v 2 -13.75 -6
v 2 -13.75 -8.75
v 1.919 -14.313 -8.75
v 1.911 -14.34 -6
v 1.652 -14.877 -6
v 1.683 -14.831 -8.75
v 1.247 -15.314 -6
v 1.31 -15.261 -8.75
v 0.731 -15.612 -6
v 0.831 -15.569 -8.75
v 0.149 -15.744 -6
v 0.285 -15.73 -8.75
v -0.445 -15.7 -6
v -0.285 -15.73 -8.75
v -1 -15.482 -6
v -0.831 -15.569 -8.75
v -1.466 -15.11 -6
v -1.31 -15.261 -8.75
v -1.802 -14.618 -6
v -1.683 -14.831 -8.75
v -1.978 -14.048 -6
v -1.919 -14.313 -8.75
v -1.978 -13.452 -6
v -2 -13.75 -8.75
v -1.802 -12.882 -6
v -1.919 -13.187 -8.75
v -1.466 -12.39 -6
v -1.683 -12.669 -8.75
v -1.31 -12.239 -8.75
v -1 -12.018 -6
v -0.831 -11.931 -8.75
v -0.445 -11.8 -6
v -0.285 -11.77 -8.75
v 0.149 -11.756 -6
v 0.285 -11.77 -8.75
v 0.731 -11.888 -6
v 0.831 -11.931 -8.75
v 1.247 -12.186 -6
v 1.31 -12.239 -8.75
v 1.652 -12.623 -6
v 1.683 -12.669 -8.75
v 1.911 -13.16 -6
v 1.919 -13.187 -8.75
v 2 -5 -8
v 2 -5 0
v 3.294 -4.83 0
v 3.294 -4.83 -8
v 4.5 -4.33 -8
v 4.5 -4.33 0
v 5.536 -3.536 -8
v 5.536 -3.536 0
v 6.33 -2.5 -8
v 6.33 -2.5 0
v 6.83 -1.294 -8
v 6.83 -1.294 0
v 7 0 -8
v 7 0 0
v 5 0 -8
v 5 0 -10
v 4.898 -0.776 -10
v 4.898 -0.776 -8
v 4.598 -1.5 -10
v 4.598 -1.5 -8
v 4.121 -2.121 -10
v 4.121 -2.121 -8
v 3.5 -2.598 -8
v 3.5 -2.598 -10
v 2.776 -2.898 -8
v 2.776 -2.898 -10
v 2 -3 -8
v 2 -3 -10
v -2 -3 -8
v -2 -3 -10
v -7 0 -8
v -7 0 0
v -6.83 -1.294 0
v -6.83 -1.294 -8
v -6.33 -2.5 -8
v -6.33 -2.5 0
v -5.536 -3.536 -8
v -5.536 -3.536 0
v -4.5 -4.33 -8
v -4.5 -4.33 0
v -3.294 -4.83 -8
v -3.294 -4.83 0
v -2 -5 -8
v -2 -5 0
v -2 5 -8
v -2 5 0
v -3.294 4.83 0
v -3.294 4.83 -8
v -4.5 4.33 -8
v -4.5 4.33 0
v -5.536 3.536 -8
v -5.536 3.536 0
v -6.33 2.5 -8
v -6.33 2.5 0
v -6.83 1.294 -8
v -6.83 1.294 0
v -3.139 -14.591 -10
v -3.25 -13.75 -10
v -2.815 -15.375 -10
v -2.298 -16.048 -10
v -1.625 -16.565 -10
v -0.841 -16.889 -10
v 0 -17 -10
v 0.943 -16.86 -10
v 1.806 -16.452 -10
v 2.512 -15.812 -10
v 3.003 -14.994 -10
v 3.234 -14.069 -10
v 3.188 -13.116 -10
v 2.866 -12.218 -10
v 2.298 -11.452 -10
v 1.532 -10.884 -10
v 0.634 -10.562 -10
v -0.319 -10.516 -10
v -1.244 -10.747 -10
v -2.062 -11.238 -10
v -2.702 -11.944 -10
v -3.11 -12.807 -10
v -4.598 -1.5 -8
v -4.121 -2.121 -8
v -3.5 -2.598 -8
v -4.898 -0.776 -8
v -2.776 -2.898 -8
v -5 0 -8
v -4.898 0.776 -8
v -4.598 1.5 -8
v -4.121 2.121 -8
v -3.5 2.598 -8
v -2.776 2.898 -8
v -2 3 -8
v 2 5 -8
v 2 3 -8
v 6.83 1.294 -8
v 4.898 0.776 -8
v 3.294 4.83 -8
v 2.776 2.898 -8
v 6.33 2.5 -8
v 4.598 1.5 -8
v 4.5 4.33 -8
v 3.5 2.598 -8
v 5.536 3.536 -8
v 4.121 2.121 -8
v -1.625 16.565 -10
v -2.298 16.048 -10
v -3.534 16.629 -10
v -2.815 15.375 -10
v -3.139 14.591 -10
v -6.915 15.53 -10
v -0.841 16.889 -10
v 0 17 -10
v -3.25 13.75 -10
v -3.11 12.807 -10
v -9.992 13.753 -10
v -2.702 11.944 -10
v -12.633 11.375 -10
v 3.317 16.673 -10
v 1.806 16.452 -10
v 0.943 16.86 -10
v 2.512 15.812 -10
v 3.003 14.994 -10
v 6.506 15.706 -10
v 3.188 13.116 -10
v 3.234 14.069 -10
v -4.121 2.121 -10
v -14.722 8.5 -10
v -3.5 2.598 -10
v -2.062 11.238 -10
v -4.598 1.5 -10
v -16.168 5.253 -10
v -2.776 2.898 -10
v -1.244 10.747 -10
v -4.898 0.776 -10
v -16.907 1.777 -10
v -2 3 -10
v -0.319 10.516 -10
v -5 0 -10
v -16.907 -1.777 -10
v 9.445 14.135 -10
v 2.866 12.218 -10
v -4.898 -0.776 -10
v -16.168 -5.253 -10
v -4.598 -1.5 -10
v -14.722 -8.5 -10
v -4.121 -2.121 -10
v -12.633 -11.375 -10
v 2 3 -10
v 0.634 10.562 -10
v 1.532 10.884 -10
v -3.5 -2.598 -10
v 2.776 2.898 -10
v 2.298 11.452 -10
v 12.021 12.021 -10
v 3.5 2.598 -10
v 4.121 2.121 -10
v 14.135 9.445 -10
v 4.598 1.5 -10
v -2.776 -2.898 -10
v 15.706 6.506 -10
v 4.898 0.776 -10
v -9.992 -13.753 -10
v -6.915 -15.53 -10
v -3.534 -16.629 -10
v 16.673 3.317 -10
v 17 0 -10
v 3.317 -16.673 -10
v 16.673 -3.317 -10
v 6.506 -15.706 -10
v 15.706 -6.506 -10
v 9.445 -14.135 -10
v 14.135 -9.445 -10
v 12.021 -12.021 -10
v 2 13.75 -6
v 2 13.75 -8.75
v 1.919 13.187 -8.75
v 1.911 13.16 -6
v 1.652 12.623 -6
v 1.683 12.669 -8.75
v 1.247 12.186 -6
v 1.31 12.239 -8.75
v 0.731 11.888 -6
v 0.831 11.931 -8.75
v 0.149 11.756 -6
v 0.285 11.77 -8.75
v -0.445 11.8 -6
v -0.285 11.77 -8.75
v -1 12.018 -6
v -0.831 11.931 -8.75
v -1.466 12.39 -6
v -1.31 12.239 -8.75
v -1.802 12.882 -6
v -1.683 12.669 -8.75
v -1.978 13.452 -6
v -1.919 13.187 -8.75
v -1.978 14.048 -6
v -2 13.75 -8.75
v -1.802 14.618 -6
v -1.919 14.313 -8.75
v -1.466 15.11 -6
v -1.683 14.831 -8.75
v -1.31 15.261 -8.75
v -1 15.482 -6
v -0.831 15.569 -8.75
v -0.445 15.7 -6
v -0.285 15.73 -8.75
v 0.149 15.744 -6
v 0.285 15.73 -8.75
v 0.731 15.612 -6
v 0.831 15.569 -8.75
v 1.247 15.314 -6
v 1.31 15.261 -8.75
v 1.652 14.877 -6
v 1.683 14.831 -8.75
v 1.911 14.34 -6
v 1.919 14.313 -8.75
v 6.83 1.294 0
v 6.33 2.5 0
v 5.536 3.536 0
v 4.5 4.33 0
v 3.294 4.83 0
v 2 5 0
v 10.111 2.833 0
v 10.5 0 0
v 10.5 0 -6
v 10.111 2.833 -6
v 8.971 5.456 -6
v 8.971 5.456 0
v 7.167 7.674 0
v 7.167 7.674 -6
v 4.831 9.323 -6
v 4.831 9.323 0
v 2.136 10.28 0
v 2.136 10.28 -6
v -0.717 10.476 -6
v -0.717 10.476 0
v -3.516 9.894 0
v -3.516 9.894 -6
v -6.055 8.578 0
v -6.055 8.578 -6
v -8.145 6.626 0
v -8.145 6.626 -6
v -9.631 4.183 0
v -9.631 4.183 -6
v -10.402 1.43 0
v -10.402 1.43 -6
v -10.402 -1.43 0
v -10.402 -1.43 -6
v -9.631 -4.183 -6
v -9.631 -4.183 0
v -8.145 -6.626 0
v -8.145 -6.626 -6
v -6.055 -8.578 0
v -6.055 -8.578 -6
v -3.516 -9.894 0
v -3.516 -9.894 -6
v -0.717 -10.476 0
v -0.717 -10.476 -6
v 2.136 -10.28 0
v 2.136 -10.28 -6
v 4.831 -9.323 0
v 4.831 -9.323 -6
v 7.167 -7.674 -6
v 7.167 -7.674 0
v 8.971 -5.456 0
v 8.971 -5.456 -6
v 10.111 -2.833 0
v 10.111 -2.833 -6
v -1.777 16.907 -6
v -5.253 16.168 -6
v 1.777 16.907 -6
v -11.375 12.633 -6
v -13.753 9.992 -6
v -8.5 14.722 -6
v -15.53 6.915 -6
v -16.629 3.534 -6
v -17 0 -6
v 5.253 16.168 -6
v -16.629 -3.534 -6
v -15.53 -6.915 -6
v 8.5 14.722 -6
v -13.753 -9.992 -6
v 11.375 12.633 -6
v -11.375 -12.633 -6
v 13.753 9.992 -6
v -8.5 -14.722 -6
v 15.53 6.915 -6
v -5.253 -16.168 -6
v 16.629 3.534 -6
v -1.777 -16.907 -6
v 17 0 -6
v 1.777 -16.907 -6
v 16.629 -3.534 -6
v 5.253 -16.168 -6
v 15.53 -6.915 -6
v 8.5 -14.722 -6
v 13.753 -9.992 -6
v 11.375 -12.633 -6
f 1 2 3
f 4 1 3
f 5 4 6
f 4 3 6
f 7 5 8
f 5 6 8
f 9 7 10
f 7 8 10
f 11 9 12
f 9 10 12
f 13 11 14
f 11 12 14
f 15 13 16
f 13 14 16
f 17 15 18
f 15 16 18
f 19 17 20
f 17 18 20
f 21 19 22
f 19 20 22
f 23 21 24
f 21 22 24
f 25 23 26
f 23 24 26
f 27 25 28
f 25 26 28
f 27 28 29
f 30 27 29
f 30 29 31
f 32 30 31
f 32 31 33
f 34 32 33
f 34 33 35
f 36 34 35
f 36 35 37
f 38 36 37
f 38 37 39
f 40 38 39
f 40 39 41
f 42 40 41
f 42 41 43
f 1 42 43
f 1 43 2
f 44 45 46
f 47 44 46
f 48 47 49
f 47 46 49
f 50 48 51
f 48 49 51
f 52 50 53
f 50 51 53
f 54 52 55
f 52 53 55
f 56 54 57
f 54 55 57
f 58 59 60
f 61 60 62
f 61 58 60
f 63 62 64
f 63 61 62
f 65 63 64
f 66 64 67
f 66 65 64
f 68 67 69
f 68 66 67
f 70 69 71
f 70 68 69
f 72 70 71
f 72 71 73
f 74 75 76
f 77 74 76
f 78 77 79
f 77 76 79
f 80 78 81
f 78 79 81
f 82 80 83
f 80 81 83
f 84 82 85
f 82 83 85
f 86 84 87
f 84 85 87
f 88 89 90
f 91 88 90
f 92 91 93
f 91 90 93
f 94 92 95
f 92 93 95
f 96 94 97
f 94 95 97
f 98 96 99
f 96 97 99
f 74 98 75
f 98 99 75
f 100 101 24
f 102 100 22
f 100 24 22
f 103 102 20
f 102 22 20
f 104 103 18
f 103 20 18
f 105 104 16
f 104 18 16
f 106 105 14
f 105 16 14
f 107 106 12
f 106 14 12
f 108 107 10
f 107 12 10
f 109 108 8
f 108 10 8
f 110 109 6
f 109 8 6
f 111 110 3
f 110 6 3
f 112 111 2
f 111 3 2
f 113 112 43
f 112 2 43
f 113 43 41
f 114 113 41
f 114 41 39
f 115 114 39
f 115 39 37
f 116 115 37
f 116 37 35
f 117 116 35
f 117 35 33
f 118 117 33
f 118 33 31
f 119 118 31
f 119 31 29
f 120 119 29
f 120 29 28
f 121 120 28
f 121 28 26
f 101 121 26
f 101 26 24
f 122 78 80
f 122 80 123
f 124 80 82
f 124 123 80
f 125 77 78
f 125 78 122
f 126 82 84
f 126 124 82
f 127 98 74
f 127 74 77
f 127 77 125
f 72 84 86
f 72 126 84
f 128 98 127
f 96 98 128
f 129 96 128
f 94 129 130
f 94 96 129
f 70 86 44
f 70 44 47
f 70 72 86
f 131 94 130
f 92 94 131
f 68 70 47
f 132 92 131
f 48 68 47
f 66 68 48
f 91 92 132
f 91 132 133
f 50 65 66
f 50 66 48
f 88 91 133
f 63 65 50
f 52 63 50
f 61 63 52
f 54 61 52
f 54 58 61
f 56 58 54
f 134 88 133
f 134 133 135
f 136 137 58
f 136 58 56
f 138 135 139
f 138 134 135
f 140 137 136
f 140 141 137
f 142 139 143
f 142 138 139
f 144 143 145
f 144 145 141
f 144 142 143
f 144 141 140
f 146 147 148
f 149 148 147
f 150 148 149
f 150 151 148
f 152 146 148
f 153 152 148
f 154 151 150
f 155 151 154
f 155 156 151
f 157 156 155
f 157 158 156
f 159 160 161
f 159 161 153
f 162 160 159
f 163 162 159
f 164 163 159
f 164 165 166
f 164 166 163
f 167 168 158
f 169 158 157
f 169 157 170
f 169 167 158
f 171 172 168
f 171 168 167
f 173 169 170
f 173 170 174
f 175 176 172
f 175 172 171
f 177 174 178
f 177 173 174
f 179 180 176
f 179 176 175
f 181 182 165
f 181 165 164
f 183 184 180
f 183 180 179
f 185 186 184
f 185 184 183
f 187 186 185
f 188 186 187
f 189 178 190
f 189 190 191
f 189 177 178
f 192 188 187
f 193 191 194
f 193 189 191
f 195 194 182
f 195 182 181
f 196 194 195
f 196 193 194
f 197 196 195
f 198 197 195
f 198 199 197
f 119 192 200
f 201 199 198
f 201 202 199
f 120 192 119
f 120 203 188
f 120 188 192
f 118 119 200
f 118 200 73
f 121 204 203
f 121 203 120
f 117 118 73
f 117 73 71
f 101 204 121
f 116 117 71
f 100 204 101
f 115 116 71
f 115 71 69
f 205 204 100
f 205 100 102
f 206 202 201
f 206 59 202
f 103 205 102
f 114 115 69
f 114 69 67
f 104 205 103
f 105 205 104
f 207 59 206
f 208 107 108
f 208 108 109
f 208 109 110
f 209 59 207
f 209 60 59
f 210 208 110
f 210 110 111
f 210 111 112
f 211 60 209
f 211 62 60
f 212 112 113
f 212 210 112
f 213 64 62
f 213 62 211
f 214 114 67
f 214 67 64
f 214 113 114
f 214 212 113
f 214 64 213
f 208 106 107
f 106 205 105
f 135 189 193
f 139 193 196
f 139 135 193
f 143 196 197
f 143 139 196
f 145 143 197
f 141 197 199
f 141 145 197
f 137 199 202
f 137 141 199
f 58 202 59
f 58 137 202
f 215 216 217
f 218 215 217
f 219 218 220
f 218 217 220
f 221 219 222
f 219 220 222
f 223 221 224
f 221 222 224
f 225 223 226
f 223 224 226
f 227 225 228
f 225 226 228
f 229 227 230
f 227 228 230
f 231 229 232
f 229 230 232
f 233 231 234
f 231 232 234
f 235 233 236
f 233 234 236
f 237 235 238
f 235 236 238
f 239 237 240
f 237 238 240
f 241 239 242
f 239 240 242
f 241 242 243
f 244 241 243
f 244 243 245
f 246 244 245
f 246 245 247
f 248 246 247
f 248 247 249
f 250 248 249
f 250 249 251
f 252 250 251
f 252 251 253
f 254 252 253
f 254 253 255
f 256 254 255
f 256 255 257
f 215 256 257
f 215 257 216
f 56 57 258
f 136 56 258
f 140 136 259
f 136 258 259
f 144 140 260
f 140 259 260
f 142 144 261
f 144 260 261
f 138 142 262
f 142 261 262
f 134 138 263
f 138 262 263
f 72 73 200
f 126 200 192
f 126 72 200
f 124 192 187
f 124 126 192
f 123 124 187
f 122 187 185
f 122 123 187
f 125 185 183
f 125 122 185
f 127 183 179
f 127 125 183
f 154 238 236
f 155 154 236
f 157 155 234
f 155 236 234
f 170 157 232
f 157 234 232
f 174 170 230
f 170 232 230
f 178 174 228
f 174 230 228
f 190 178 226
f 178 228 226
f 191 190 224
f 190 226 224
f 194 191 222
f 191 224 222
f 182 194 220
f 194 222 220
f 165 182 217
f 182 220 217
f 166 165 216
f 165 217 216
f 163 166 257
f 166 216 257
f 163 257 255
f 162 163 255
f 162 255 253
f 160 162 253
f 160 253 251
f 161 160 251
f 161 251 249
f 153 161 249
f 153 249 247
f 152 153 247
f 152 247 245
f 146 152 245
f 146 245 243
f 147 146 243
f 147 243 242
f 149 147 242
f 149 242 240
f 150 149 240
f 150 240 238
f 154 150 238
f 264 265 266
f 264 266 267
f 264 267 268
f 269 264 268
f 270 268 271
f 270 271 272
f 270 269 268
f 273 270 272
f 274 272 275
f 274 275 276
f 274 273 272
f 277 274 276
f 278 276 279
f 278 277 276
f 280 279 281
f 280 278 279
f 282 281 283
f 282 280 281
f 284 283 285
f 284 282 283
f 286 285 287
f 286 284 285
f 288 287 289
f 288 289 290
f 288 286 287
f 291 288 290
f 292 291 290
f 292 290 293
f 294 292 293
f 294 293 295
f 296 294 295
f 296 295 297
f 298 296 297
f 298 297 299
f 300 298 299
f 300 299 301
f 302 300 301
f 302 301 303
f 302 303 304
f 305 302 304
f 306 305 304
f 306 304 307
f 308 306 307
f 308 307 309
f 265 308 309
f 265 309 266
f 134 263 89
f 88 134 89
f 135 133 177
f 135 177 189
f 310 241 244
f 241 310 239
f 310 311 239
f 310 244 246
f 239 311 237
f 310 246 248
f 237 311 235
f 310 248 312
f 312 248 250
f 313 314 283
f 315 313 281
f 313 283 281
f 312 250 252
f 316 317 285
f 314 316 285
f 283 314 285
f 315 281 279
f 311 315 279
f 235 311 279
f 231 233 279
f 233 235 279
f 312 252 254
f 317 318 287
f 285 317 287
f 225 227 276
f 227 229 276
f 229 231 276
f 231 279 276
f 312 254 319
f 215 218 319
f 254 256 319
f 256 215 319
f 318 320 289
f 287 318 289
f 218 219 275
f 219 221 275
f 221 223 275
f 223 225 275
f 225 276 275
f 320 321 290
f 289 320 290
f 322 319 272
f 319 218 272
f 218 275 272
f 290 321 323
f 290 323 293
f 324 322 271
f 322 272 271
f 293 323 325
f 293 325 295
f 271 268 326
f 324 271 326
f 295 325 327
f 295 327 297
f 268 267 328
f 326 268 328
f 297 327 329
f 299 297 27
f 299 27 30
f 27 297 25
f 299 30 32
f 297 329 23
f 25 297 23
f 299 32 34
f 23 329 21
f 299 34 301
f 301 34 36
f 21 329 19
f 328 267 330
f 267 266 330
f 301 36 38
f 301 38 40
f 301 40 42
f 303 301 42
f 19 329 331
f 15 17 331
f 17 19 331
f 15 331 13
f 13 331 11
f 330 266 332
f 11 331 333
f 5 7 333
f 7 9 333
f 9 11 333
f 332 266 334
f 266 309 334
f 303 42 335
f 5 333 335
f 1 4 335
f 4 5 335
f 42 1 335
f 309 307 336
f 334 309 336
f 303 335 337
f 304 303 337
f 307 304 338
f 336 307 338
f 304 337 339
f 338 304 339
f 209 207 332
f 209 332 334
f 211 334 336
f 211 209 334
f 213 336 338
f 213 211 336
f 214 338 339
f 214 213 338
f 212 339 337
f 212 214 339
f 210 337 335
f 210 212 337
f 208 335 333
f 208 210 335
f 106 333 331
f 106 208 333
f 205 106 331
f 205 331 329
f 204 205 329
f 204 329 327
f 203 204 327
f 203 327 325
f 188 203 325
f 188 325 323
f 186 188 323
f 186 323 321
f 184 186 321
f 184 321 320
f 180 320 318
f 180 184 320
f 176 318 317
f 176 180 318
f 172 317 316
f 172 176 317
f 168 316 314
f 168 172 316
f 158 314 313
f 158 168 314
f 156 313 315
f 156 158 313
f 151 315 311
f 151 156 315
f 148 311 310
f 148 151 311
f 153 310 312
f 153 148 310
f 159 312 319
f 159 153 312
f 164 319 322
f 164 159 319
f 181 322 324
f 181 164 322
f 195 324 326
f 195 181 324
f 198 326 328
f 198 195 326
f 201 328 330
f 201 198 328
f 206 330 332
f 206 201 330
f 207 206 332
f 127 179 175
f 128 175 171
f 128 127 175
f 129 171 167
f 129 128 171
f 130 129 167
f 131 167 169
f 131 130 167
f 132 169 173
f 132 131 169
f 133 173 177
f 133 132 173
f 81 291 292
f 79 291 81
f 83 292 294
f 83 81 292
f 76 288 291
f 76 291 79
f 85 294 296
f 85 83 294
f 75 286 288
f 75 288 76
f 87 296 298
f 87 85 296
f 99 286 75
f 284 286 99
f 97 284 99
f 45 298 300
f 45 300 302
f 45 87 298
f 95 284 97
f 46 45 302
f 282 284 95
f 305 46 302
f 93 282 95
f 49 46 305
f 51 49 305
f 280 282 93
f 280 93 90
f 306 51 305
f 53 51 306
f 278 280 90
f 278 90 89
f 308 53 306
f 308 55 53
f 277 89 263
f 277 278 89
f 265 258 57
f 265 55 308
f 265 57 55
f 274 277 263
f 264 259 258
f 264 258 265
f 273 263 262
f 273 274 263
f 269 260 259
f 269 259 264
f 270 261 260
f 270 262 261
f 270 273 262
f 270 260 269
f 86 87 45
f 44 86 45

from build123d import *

# Parameters (mm, degrees)
F0_R           = 10.5
F1_DEPTH       = 10
F3_R           = 17
F3_R_2         = 2
F3_R_3         = 9.1303140993
F4_DEPTH       = 4
F5_D           = 4
F5_DEPTH       = 10
F5_CSINK_D     = 6.5
F5_CSINK_ANGLE = 90
F5_TIP         = 1.2017212381
F7_DEPTH       = 8


with BuildPart() as f1:
    # F0 (on Top) → F1 (new body)
    with BuildSketch(Plane.XY):
        Circle(F0_R)
        with BuildLine():
            ThreePointArc((-5, 0), (-4.1213203436, 2.1213203436), (-2, 3))
            Line((-2, 3), (2, 3))
            ThreePointArc((2, 3), (4.1213203436, 2.1213203436), (5, 0))
            ThreePointArc((5, 0), (4.1213203436, -2.1213203436), (2, -3))
            Line((2, -3), (-2, -3))
            ThreePointArc((-2, -3), (-4.1213203436, -2.1213203436), (-5, 0))
        make_face(mode=Mode.SUBTRACT)
    extrude(amount=-F1_DEPTH)

    # F3 (on offset) → F4 (join)
    with BuildSketch(Plane(origin=(0, 0, -10), x_dir=(1, 0, 0), z_dir=(0, 0, -1))):
        Circle(F3_R)
        with Locations((0, -13.75)):
            Circle(F3_R_2, mode=Mode.SUBTRACT)
        Circle(F3_R_3, mode=Mode.SUBTRACT)
        with Locations((0, 13.75)):
            Circle(F3_R_2, mode=Mode.SUBTRACT)
    extrude(amount=-F4_DEPTH)

    # F5
    with Locations(Plane(origin=(0, 0, -10), x_dir=(1, 0, 0), z_dir=(0, 0, -1))):
        with Locations((0, 13.75), (0, -13.75)):
            CounterSinkHole(F5_D / 2, F5_CSINK_D / 2, depth=F5_DEPTH, counter_sink_angle=F5_CSINK_ANGLE)
            with Locations((0, 0, -(F5_DEPTH + F5_TIP / 2))):  # 118° drill point
                Cone(0, F5_D / 2, F5_TIP, mode=Mode.SUBTRACT)

    # F6 (on face) → F7 (cut)
    with BuildSketch(Plane.XY):
        with BuildLine():
            Line((2, 5), (-2, 5))
            ThreePointArc((-2, 5), (-5.5355339059, 3.5355339059), (-7, 0))
            ThreePointArc((-7, 0), (-5.5355339059, -3.5355339059), (-2, -5))
            Line((-2, -5), (2, -5))
            ThreePointArc((2, -5), (5.5355339059, -3.5355339059), (7, 0))
            ThreePointArc((7, 0), (5.5355339059, 3.5355339059), (2, 5))
        make_face()
        with BuildLine():
            Line((2, -3), (-2, -3))
            ThreePointArc((-2, -3), (-5, 0), (-2, 3))
            Line((-2, 3), (2, 3))
            ThreePointArc((2, 3), (5, 0), (2, -3))
        make_face(mode=Mode.SUBTRACT)
    extrude(amount=-F7_DEPTH, mode=Mode.SUBTRACT)


solid = f1.part
